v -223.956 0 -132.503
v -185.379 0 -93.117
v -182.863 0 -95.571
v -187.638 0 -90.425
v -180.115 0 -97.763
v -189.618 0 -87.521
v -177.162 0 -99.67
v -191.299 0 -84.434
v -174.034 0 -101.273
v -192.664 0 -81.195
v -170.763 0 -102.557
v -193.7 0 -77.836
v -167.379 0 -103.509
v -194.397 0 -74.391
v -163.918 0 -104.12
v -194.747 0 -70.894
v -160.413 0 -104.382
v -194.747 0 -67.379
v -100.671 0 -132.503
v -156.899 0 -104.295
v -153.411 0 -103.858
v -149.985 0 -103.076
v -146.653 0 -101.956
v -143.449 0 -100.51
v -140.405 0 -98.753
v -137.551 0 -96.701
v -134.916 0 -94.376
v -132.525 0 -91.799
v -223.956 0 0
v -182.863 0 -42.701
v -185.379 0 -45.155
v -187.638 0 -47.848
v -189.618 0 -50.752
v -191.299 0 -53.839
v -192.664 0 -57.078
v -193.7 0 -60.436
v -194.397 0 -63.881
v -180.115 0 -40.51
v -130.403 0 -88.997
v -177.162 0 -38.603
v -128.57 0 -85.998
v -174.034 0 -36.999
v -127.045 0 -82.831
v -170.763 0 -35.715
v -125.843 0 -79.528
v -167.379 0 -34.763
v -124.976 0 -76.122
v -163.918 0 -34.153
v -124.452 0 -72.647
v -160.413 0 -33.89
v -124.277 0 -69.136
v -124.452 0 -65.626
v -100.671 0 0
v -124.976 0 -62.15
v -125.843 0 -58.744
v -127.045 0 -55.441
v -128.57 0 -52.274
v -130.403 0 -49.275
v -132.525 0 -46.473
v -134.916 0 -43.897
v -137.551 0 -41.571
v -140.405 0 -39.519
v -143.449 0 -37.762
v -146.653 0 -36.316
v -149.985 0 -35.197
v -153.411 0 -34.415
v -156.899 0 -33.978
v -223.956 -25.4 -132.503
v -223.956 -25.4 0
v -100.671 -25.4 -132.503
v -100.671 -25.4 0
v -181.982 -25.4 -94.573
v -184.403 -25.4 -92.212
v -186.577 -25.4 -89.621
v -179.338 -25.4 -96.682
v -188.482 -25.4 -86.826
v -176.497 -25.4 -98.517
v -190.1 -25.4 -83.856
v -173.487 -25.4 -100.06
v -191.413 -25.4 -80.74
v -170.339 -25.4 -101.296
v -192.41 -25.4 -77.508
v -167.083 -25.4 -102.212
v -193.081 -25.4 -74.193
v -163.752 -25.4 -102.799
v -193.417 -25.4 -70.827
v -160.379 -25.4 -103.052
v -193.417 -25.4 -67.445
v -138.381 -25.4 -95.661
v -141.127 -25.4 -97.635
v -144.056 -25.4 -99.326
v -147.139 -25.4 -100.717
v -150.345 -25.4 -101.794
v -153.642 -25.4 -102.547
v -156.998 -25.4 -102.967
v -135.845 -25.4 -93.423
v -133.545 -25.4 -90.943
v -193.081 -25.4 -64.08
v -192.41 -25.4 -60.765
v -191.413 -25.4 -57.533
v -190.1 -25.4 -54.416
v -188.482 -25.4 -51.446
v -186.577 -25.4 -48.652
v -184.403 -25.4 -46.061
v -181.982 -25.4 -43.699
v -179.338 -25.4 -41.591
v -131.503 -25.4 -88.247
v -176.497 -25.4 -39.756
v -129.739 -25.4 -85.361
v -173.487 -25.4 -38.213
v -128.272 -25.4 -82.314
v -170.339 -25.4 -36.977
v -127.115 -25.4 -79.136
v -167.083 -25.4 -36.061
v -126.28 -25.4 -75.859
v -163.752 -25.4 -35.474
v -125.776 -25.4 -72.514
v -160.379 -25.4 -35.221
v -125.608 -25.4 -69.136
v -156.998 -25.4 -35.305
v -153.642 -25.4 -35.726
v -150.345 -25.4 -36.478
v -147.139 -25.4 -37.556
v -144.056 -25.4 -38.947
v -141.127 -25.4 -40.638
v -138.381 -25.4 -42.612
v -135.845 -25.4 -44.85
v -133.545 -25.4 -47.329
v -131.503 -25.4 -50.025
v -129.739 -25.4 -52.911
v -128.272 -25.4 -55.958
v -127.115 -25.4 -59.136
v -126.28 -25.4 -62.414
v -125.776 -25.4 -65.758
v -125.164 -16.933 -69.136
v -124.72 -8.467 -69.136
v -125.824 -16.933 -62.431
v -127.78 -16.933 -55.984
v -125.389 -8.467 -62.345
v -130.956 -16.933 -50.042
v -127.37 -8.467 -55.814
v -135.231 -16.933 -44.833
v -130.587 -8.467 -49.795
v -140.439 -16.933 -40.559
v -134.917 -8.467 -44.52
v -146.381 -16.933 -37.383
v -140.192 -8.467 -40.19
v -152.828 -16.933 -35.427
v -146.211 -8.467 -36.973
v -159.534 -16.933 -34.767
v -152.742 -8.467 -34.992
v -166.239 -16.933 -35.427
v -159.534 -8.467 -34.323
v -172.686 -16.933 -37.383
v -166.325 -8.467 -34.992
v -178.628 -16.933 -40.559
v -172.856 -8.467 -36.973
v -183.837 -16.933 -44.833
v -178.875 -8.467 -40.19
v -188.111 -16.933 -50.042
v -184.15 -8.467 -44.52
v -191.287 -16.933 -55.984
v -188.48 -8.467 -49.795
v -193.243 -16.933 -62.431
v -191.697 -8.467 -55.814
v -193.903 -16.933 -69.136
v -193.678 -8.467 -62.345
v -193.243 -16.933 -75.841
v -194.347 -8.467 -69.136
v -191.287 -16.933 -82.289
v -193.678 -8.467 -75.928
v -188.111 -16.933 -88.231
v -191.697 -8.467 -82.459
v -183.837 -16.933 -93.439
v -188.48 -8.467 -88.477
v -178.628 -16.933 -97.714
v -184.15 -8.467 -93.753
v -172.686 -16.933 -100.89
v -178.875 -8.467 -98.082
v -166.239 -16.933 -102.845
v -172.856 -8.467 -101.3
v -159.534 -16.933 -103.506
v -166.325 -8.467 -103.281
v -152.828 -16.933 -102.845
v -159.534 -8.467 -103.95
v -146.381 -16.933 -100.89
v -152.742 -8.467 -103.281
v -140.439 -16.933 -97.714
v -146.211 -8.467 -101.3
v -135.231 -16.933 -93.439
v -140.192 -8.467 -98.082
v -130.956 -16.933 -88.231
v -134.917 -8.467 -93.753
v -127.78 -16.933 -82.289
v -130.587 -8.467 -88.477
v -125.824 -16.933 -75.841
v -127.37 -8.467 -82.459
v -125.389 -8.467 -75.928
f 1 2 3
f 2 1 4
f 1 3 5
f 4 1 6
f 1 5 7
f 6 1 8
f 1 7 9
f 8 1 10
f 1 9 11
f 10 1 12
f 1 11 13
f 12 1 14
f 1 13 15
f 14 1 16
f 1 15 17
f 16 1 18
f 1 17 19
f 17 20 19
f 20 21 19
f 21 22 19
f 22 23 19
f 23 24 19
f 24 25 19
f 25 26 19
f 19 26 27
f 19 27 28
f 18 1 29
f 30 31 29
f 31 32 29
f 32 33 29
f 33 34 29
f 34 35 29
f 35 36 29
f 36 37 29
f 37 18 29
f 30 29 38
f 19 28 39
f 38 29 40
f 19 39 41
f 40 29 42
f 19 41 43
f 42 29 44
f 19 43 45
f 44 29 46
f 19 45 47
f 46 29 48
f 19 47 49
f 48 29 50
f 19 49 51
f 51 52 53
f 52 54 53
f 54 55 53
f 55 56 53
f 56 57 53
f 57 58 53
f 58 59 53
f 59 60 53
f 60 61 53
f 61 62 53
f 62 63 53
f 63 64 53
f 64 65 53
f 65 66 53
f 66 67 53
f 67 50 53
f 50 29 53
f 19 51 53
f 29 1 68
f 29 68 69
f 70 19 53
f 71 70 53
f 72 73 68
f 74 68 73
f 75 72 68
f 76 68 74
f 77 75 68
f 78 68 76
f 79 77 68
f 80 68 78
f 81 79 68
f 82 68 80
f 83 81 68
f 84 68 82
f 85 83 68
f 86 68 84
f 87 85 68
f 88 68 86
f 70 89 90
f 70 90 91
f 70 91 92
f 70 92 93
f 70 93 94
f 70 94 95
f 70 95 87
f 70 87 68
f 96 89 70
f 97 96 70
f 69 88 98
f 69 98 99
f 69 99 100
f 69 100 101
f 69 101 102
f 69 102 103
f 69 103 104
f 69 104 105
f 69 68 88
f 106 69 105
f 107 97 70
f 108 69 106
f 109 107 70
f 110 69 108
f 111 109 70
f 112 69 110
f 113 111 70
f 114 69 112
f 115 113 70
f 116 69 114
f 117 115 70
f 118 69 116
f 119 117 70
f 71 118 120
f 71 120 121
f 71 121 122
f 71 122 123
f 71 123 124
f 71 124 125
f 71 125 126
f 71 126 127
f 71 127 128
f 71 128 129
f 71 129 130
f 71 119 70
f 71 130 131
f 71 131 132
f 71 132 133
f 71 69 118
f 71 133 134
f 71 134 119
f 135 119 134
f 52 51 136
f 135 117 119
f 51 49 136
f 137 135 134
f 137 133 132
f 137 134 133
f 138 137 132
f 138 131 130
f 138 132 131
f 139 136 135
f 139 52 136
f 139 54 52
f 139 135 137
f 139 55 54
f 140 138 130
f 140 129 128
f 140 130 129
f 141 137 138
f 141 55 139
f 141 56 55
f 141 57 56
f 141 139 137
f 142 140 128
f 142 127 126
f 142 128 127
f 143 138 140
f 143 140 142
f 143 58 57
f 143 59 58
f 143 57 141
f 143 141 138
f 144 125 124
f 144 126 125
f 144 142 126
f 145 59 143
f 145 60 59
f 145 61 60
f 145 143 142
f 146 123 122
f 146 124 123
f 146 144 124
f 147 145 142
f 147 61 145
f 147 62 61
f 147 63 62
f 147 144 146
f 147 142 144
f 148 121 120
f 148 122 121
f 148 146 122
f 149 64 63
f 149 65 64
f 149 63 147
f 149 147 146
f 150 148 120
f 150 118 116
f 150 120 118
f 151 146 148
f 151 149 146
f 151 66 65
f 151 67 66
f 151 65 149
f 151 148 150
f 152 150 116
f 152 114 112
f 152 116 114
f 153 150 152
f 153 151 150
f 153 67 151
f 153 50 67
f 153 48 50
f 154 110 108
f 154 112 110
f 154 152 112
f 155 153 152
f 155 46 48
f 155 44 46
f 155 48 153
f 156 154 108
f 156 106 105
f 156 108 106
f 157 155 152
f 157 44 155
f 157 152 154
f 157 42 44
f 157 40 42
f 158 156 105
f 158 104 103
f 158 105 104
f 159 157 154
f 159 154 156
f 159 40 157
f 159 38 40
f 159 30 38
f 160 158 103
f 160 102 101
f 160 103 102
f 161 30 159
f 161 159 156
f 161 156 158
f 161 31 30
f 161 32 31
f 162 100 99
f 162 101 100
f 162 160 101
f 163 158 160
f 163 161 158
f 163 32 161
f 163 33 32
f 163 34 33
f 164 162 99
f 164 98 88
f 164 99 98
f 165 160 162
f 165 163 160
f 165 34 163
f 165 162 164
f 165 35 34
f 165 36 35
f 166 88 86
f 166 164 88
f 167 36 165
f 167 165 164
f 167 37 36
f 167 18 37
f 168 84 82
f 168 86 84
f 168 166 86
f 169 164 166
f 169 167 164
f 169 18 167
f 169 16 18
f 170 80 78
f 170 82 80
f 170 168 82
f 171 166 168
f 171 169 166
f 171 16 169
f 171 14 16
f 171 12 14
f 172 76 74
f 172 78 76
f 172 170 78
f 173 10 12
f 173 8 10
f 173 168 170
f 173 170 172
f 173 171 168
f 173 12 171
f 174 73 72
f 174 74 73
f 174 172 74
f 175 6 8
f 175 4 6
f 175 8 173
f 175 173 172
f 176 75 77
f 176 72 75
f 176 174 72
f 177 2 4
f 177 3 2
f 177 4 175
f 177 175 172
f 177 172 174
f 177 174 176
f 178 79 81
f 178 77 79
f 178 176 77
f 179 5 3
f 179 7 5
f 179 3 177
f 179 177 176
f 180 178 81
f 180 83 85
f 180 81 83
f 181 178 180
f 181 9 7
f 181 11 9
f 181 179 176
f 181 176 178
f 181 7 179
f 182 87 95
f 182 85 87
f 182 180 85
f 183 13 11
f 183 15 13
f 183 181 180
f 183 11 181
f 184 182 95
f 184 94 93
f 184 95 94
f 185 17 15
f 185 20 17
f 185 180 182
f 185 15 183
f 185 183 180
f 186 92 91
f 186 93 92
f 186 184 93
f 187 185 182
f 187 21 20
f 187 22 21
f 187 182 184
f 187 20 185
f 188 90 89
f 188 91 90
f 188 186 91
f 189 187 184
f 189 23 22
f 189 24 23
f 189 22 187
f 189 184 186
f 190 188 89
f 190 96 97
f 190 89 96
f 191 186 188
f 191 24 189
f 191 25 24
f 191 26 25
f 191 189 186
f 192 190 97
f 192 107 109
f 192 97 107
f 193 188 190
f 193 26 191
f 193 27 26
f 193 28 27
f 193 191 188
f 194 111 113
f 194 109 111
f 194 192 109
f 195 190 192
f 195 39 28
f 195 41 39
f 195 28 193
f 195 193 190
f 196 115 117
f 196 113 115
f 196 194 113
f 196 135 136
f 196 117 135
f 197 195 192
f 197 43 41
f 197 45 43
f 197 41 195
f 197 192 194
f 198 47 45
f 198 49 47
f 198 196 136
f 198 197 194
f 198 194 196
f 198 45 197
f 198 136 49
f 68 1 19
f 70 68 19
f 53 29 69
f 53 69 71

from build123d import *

# Parameters (mm, degrees)
F0_W     = 123.2844814658
F0_H     = 132.5032711029
F1_DEPTH = 25.4
F2_R     = 33.9258484302
F3_DEPTH = 25.4
F3_TAPER = -3


with BuildPart() as f1:
    # F0 (on Front) → F1 (new body)
    with BuildSketch(Plane.XZ):
        with Locations((-162.3135991395, -66.2516355515)):
            Rectangle(F0_W, F0_H)
    extrude(amount=F1_DEPTH)

    # F2 (on face) → F3 (cut)
    with BuildSketch(Plane.XZ.offset(25.4)):
        with Locations((-159.5336198807, -69.13626194)):
            Circle(F2_R)
    extrude(amount=-F3_DEPTH, taper=F3_TAPER, mode=Mode.SUBTRACT)


solid = f1.part
